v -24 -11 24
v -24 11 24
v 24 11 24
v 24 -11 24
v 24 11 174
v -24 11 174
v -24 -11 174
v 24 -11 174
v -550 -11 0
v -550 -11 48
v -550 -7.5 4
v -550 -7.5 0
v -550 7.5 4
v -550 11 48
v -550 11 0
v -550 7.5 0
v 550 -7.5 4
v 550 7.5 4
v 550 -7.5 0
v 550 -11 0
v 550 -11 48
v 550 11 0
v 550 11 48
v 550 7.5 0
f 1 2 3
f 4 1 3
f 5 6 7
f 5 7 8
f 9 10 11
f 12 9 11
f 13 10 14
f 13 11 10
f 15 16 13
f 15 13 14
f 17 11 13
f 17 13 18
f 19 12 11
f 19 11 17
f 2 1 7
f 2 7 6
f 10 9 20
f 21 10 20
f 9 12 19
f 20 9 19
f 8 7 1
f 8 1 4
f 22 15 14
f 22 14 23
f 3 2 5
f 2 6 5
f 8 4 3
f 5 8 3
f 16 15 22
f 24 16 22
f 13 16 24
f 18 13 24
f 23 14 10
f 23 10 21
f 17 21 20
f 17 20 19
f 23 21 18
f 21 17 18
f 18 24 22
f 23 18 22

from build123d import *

# Parameters (mm, degrees)
F0_W          = 1100
F0_H          = 22
F1_DEPTH      = 48
F2_W          = 48
F2_H          = 22
F3_DEPTH      = 126
F3_DEPTH_BACK = 24
F4_W          = 1100
F4_H          = 15
F5_DEPTH      = 4


with BuildPart() as f1:
    # F0 (on Top) → F1 (new body)
    with BuildSketch(Plane.XY):
        Rectangle(F0_W, F0_H)
    extrude(amount=F1_DEPTH)

    # F4 (on face) → F5 (cut)
    with BuildSketch(Plane(origin=(0, 0, 0), x_dir=(1, 0, 0), z_dir=(0, 0, -1))):
        Rectangle(F4_W, F4_H)
    extrude(amount=-F5_DEPTH, mode=Mode.SUBTRACT)


with BuildPart() as f3:
    # F2 (on face) → F3 (new body, two sides)
    with BuildSketch(Plane.XY.offset(48)) as f3_sk:
        Rectangle(F2_W, F2_H)
    extrude(amount=F3_DEPTH)
    extrude(f3_sk.sketch, amount=-F3_DEPTH_BACK)


solid = Compound([f1.part, f3.part])
